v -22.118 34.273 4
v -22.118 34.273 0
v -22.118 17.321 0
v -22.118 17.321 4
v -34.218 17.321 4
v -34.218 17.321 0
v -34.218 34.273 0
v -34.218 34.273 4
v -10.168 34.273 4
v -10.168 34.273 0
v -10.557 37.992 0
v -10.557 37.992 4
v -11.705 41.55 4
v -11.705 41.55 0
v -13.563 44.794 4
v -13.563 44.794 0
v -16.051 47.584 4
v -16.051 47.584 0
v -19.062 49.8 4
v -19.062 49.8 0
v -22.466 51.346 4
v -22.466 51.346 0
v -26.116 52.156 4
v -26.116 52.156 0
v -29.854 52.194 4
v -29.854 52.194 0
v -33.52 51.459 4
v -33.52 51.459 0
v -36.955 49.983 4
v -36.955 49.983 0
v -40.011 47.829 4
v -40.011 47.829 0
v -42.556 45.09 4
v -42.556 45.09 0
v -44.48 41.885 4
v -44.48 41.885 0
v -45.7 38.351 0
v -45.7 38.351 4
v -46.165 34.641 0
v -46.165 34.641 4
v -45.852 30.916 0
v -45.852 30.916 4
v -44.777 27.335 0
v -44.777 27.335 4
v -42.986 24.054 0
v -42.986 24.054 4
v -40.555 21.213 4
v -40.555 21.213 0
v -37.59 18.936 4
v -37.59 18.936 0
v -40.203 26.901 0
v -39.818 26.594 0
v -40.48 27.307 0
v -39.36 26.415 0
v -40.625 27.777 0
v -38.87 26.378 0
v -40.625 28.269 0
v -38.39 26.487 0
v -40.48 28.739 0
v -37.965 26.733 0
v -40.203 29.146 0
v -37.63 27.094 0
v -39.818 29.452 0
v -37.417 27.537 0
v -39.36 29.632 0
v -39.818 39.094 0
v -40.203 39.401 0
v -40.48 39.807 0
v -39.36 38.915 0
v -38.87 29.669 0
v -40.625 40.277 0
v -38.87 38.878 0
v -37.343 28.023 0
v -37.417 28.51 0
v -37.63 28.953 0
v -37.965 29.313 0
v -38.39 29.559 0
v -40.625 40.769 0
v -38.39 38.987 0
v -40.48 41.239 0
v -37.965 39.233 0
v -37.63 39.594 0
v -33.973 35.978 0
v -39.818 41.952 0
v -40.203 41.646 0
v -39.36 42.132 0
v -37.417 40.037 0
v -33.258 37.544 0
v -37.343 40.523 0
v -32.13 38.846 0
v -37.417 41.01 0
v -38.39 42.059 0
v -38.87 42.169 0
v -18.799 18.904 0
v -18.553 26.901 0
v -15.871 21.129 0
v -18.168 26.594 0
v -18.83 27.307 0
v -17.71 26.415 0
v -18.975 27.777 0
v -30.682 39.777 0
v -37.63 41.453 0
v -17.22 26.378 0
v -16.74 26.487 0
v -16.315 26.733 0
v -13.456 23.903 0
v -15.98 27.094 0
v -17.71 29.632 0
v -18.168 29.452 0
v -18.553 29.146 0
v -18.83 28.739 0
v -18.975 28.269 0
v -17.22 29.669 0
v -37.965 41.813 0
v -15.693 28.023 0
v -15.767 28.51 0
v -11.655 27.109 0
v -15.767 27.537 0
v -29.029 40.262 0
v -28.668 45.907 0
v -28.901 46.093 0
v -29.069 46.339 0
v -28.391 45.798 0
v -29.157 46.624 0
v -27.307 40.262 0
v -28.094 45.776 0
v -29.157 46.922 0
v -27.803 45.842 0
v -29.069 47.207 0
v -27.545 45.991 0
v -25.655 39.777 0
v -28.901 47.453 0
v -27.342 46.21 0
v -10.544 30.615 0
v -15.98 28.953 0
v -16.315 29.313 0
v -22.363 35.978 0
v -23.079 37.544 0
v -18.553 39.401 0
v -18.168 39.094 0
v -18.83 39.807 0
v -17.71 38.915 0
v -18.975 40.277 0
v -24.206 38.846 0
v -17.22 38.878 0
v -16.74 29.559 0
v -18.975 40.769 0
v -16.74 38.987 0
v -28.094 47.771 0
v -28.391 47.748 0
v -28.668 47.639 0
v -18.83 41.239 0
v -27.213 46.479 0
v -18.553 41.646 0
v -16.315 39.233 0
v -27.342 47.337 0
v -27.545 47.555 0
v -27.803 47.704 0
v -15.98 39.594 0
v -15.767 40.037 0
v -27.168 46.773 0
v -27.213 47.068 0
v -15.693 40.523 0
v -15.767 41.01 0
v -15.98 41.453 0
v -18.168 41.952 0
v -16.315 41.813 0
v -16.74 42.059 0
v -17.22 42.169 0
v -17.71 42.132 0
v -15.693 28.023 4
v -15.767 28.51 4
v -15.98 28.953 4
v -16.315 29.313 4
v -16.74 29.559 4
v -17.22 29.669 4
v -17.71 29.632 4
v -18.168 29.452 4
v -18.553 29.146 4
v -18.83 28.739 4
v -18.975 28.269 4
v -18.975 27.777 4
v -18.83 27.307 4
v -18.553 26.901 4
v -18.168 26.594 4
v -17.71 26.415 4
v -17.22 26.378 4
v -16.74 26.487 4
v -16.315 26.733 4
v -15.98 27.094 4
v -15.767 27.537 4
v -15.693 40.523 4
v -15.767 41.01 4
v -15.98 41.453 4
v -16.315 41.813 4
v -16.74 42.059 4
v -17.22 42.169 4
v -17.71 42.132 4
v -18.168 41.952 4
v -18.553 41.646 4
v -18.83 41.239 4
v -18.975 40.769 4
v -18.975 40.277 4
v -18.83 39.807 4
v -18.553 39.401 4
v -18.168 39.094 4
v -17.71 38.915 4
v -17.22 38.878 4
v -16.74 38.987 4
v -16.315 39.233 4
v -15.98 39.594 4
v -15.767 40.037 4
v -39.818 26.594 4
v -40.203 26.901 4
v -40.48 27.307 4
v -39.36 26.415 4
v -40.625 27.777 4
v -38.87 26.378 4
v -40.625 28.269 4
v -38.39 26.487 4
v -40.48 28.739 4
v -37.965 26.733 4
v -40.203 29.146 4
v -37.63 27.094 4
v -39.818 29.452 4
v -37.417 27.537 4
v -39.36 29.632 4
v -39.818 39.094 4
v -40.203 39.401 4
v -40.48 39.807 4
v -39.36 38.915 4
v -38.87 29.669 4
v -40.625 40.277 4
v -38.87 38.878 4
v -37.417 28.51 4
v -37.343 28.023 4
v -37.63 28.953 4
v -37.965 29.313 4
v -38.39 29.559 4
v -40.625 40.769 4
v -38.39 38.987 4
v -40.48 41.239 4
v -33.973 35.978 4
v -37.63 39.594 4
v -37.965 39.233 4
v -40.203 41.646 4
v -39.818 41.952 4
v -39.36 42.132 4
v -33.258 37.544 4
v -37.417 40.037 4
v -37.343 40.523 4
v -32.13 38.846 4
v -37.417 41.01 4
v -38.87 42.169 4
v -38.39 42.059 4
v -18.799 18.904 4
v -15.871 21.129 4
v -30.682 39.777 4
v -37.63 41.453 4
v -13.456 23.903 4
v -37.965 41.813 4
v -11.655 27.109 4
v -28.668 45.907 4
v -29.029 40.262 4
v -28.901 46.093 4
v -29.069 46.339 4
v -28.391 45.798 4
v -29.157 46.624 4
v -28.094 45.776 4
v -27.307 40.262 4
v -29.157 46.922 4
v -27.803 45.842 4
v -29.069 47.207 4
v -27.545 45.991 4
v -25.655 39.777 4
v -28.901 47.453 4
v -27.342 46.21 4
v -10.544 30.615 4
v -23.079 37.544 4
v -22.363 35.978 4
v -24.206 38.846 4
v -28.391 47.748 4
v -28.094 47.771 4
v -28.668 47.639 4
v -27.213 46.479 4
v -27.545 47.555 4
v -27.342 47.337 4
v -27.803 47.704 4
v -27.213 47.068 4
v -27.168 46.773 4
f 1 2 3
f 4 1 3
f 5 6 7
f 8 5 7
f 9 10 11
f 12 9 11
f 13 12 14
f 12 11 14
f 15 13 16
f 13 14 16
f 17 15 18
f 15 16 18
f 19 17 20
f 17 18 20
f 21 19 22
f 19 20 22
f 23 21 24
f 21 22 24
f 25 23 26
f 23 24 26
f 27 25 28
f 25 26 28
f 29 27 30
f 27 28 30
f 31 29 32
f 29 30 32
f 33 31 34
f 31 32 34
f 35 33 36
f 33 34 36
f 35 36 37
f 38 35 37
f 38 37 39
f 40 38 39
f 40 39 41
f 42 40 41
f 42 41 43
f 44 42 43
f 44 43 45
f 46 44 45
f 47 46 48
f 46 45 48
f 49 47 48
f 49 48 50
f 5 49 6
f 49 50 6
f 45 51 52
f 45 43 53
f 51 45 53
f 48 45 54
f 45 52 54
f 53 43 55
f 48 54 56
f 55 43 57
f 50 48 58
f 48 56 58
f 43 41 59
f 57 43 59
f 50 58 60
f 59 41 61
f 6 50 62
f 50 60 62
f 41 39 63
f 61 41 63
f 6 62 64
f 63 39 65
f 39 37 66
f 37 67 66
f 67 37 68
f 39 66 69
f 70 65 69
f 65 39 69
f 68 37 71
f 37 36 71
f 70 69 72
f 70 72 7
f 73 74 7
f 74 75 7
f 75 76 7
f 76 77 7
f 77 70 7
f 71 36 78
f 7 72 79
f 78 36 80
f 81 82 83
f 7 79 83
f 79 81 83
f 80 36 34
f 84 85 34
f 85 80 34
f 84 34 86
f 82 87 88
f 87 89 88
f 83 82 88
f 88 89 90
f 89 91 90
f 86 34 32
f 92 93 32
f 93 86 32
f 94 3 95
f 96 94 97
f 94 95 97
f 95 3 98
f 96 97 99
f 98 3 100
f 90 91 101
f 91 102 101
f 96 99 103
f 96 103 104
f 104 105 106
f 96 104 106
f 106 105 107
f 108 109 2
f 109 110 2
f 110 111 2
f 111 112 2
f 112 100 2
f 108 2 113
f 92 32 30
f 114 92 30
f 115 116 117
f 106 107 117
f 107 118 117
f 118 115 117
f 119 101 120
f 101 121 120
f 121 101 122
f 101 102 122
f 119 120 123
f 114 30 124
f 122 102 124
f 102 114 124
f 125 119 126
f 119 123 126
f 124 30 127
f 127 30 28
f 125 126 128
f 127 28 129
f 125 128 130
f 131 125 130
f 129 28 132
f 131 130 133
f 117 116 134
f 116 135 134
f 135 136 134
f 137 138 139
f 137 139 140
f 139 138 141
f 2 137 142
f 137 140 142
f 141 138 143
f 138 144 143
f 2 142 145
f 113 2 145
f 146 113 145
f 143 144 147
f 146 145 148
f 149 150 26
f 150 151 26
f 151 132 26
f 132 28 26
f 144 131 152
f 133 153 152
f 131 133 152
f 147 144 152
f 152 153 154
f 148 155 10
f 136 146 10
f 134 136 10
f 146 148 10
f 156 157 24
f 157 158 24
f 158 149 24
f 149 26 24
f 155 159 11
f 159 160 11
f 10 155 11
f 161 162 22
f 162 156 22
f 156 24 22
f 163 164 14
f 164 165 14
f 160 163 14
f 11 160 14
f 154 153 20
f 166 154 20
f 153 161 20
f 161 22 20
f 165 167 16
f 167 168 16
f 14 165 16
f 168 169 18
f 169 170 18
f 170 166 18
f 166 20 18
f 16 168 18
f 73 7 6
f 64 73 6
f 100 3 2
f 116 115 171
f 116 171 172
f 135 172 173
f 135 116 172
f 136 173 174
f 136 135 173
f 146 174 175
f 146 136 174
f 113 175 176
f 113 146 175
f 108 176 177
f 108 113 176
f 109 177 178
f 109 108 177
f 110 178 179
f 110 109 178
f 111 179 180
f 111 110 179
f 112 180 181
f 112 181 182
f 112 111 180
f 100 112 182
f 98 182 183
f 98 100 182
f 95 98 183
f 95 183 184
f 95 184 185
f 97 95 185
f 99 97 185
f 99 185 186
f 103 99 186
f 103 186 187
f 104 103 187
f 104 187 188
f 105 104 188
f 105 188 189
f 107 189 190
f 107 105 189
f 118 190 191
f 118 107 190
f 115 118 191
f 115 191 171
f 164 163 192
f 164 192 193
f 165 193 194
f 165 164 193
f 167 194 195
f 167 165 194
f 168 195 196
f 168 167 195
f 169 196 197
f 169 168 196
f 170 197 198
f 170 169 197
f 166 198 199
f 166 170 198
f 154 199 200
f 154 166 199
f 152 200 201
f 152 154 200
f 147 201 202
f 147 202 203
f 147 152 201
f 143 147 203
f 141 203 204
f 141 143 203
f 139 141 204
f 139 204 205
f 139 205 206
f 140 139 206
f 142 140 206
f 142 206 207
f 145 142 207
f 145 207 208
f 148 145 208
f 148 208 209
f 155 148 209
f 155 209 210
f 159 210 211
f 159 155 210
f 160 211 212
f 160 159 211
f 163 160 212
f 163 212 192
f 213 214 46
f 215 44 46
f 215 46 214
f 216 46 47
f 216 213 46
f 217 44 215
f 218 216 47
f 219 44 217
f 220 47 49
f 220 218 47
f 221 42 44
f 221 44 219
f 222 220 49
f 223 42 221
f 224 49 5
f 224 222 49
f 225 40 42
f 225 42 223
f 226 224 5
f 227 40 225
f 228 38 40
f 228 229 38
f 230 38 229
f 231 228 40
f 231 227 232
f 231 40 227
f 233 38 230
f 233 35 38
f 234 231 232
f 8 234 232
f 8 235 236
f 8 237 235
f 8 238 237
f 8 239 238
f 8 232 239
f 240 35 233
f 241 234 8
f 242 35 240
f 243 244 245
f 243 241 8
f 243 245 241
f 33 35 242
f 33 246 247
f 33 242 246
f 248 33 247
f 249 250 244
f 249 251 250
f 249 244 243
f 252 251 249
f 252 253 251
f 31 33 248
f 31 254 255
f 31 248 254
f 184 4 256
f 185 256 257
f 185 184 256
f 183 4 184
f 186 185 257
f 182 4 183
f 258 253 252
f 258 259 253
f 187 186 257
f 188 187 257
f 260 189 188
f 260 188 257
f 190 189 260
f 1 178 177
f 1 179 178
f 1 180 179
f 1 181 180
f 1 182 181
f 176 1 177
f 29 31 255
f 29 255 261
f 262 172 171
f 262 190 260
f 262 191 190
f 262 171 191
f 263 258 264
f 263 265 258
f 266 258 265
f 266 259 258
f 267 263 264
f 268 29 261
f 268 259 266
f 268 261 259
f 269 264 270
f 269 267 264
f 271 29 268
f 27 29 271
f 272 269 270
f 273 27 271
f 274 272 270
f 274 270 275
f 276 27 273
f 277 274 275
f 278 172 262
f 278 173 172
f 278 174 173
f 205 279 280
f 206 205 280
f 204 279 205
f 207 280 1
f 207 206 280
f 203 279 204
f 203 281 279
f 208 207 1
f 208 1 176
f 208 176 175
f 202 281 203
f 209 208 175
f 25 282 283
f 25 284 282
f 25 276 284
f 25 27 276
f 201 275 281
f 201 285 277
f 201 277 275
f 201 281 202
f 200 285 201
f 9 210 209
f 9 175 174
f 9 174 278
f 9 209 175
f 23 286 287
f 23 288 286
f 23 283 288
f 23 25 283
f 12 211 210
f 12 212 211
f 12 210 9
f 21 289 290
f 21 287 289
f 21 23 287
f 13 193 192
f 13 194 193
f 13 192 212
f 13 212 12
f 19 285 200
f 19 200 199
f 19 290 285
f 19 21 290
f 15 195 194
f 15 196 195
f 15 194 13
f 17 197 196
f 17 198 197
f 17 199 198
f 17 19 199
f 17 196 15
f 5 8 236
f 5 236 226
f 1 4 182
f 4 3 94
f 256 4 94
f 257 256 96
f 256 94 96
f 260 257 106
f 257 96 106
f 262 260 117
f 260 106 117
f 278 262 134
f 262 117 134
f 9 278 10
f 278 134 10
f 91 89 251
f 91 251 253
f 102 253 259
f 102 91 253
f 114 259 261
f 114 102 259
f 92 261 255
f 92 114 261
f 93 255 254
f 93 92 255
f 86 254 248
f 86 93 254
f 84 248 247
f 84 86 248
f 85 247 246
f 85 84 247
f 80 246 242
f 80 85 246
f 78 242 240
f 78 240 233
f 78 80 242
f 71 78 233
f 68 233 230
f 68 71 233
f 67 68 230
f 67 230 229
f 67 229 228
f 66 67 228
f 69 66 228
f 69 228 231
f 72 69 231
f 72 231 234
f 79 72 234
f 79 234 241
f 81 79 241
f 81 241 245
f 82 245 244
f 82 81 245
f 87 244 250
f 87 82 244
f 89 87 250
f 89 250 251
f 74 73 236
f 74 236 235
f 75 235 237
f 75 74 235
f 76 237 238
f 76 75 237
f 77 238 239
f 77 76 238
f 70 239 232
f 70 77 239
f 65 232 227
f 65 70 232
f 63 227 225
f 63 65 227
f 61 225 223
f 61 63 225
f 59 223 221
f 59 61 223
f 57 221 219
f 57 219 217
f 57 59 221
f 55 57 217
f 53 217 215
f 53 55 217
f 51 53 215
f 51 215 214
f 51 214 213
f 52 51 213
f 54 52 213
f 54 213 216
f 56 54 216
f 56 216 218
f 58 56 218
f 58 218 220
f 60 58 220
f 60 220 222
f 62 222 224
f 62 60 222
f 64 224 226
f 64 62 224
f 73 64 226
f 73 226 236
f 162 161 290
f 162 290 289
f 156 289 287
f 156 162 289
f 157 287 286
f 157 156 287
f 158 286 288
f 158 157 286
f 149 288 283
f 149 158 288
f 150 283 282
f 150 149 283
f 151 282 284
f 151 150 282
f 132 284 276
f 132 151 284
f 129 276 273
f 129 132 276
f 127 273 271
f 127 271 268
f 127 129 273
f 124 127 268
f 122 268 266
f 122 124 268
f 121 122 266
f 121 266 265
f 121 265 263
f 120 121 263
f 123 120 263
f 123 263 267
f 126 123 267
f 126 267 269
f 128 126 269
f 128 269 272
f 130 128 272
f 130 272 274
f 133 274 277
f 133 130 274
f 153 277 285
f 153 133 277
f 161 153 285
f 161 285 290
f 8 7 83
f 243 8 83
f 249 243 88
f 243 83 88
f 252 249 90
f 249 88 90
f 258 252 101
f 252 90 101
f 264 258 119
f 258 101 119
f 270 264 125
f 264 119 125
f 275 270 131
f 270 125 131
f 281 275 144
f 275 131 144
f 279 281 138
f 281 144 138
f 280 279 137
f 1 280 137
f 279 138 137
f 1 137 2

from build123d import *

# Parameters (mm, degrees)
F0_R     = 1.65
F0_R_2   = 1
F1_DEPTH = 4


with BuildPart() as f1:
    # F0 (on Top) → F1 (new body)
    with BuildSketch(Plane.XY):
        with BuildLine():
            ThreePointArc((-22.118284, 17.320522), (-13.456044, 23.902693), (-10.168284, 34.273324))
            ThreePointArc((-10.168284, 34.273324), (-38.538916, 48.985564), (-34.218284, 17.320522))
            Line((-34.218284, 17.320522), (-34.218284, 34.273324))
            ThreePointArc((-34.218284, 34.273324), (-28.168284, 40.323324), (-22.118284, 34.273324))
            Line((-22.118284, 34.273324), (-22.118284, 17.320522))
        make_face()
        with Locations((-38.993284, 28.023324)):
            Circle(F0_R, mode=Mode.SUBTRACT)
        with Locations((-17.343284, 28.023324)):
            Circle(F0_R, mode=Mode.SUBTRACT)
        with Locations((-38.993284, 40.523324)):
            Circle(F0_R, mode=Mode.SUBTRACT)
        with Locations((-28.168284, 46.773324)):
            Circle(F0_R_2, mode=Mode.SUBTRACT)
        with Locations((-17.343284, 40.523324)):
            Circle(F0_R, mode=Mode.SUBTRACT)
    extrude(amount=F1_DEPTH)


solid = f1.part
